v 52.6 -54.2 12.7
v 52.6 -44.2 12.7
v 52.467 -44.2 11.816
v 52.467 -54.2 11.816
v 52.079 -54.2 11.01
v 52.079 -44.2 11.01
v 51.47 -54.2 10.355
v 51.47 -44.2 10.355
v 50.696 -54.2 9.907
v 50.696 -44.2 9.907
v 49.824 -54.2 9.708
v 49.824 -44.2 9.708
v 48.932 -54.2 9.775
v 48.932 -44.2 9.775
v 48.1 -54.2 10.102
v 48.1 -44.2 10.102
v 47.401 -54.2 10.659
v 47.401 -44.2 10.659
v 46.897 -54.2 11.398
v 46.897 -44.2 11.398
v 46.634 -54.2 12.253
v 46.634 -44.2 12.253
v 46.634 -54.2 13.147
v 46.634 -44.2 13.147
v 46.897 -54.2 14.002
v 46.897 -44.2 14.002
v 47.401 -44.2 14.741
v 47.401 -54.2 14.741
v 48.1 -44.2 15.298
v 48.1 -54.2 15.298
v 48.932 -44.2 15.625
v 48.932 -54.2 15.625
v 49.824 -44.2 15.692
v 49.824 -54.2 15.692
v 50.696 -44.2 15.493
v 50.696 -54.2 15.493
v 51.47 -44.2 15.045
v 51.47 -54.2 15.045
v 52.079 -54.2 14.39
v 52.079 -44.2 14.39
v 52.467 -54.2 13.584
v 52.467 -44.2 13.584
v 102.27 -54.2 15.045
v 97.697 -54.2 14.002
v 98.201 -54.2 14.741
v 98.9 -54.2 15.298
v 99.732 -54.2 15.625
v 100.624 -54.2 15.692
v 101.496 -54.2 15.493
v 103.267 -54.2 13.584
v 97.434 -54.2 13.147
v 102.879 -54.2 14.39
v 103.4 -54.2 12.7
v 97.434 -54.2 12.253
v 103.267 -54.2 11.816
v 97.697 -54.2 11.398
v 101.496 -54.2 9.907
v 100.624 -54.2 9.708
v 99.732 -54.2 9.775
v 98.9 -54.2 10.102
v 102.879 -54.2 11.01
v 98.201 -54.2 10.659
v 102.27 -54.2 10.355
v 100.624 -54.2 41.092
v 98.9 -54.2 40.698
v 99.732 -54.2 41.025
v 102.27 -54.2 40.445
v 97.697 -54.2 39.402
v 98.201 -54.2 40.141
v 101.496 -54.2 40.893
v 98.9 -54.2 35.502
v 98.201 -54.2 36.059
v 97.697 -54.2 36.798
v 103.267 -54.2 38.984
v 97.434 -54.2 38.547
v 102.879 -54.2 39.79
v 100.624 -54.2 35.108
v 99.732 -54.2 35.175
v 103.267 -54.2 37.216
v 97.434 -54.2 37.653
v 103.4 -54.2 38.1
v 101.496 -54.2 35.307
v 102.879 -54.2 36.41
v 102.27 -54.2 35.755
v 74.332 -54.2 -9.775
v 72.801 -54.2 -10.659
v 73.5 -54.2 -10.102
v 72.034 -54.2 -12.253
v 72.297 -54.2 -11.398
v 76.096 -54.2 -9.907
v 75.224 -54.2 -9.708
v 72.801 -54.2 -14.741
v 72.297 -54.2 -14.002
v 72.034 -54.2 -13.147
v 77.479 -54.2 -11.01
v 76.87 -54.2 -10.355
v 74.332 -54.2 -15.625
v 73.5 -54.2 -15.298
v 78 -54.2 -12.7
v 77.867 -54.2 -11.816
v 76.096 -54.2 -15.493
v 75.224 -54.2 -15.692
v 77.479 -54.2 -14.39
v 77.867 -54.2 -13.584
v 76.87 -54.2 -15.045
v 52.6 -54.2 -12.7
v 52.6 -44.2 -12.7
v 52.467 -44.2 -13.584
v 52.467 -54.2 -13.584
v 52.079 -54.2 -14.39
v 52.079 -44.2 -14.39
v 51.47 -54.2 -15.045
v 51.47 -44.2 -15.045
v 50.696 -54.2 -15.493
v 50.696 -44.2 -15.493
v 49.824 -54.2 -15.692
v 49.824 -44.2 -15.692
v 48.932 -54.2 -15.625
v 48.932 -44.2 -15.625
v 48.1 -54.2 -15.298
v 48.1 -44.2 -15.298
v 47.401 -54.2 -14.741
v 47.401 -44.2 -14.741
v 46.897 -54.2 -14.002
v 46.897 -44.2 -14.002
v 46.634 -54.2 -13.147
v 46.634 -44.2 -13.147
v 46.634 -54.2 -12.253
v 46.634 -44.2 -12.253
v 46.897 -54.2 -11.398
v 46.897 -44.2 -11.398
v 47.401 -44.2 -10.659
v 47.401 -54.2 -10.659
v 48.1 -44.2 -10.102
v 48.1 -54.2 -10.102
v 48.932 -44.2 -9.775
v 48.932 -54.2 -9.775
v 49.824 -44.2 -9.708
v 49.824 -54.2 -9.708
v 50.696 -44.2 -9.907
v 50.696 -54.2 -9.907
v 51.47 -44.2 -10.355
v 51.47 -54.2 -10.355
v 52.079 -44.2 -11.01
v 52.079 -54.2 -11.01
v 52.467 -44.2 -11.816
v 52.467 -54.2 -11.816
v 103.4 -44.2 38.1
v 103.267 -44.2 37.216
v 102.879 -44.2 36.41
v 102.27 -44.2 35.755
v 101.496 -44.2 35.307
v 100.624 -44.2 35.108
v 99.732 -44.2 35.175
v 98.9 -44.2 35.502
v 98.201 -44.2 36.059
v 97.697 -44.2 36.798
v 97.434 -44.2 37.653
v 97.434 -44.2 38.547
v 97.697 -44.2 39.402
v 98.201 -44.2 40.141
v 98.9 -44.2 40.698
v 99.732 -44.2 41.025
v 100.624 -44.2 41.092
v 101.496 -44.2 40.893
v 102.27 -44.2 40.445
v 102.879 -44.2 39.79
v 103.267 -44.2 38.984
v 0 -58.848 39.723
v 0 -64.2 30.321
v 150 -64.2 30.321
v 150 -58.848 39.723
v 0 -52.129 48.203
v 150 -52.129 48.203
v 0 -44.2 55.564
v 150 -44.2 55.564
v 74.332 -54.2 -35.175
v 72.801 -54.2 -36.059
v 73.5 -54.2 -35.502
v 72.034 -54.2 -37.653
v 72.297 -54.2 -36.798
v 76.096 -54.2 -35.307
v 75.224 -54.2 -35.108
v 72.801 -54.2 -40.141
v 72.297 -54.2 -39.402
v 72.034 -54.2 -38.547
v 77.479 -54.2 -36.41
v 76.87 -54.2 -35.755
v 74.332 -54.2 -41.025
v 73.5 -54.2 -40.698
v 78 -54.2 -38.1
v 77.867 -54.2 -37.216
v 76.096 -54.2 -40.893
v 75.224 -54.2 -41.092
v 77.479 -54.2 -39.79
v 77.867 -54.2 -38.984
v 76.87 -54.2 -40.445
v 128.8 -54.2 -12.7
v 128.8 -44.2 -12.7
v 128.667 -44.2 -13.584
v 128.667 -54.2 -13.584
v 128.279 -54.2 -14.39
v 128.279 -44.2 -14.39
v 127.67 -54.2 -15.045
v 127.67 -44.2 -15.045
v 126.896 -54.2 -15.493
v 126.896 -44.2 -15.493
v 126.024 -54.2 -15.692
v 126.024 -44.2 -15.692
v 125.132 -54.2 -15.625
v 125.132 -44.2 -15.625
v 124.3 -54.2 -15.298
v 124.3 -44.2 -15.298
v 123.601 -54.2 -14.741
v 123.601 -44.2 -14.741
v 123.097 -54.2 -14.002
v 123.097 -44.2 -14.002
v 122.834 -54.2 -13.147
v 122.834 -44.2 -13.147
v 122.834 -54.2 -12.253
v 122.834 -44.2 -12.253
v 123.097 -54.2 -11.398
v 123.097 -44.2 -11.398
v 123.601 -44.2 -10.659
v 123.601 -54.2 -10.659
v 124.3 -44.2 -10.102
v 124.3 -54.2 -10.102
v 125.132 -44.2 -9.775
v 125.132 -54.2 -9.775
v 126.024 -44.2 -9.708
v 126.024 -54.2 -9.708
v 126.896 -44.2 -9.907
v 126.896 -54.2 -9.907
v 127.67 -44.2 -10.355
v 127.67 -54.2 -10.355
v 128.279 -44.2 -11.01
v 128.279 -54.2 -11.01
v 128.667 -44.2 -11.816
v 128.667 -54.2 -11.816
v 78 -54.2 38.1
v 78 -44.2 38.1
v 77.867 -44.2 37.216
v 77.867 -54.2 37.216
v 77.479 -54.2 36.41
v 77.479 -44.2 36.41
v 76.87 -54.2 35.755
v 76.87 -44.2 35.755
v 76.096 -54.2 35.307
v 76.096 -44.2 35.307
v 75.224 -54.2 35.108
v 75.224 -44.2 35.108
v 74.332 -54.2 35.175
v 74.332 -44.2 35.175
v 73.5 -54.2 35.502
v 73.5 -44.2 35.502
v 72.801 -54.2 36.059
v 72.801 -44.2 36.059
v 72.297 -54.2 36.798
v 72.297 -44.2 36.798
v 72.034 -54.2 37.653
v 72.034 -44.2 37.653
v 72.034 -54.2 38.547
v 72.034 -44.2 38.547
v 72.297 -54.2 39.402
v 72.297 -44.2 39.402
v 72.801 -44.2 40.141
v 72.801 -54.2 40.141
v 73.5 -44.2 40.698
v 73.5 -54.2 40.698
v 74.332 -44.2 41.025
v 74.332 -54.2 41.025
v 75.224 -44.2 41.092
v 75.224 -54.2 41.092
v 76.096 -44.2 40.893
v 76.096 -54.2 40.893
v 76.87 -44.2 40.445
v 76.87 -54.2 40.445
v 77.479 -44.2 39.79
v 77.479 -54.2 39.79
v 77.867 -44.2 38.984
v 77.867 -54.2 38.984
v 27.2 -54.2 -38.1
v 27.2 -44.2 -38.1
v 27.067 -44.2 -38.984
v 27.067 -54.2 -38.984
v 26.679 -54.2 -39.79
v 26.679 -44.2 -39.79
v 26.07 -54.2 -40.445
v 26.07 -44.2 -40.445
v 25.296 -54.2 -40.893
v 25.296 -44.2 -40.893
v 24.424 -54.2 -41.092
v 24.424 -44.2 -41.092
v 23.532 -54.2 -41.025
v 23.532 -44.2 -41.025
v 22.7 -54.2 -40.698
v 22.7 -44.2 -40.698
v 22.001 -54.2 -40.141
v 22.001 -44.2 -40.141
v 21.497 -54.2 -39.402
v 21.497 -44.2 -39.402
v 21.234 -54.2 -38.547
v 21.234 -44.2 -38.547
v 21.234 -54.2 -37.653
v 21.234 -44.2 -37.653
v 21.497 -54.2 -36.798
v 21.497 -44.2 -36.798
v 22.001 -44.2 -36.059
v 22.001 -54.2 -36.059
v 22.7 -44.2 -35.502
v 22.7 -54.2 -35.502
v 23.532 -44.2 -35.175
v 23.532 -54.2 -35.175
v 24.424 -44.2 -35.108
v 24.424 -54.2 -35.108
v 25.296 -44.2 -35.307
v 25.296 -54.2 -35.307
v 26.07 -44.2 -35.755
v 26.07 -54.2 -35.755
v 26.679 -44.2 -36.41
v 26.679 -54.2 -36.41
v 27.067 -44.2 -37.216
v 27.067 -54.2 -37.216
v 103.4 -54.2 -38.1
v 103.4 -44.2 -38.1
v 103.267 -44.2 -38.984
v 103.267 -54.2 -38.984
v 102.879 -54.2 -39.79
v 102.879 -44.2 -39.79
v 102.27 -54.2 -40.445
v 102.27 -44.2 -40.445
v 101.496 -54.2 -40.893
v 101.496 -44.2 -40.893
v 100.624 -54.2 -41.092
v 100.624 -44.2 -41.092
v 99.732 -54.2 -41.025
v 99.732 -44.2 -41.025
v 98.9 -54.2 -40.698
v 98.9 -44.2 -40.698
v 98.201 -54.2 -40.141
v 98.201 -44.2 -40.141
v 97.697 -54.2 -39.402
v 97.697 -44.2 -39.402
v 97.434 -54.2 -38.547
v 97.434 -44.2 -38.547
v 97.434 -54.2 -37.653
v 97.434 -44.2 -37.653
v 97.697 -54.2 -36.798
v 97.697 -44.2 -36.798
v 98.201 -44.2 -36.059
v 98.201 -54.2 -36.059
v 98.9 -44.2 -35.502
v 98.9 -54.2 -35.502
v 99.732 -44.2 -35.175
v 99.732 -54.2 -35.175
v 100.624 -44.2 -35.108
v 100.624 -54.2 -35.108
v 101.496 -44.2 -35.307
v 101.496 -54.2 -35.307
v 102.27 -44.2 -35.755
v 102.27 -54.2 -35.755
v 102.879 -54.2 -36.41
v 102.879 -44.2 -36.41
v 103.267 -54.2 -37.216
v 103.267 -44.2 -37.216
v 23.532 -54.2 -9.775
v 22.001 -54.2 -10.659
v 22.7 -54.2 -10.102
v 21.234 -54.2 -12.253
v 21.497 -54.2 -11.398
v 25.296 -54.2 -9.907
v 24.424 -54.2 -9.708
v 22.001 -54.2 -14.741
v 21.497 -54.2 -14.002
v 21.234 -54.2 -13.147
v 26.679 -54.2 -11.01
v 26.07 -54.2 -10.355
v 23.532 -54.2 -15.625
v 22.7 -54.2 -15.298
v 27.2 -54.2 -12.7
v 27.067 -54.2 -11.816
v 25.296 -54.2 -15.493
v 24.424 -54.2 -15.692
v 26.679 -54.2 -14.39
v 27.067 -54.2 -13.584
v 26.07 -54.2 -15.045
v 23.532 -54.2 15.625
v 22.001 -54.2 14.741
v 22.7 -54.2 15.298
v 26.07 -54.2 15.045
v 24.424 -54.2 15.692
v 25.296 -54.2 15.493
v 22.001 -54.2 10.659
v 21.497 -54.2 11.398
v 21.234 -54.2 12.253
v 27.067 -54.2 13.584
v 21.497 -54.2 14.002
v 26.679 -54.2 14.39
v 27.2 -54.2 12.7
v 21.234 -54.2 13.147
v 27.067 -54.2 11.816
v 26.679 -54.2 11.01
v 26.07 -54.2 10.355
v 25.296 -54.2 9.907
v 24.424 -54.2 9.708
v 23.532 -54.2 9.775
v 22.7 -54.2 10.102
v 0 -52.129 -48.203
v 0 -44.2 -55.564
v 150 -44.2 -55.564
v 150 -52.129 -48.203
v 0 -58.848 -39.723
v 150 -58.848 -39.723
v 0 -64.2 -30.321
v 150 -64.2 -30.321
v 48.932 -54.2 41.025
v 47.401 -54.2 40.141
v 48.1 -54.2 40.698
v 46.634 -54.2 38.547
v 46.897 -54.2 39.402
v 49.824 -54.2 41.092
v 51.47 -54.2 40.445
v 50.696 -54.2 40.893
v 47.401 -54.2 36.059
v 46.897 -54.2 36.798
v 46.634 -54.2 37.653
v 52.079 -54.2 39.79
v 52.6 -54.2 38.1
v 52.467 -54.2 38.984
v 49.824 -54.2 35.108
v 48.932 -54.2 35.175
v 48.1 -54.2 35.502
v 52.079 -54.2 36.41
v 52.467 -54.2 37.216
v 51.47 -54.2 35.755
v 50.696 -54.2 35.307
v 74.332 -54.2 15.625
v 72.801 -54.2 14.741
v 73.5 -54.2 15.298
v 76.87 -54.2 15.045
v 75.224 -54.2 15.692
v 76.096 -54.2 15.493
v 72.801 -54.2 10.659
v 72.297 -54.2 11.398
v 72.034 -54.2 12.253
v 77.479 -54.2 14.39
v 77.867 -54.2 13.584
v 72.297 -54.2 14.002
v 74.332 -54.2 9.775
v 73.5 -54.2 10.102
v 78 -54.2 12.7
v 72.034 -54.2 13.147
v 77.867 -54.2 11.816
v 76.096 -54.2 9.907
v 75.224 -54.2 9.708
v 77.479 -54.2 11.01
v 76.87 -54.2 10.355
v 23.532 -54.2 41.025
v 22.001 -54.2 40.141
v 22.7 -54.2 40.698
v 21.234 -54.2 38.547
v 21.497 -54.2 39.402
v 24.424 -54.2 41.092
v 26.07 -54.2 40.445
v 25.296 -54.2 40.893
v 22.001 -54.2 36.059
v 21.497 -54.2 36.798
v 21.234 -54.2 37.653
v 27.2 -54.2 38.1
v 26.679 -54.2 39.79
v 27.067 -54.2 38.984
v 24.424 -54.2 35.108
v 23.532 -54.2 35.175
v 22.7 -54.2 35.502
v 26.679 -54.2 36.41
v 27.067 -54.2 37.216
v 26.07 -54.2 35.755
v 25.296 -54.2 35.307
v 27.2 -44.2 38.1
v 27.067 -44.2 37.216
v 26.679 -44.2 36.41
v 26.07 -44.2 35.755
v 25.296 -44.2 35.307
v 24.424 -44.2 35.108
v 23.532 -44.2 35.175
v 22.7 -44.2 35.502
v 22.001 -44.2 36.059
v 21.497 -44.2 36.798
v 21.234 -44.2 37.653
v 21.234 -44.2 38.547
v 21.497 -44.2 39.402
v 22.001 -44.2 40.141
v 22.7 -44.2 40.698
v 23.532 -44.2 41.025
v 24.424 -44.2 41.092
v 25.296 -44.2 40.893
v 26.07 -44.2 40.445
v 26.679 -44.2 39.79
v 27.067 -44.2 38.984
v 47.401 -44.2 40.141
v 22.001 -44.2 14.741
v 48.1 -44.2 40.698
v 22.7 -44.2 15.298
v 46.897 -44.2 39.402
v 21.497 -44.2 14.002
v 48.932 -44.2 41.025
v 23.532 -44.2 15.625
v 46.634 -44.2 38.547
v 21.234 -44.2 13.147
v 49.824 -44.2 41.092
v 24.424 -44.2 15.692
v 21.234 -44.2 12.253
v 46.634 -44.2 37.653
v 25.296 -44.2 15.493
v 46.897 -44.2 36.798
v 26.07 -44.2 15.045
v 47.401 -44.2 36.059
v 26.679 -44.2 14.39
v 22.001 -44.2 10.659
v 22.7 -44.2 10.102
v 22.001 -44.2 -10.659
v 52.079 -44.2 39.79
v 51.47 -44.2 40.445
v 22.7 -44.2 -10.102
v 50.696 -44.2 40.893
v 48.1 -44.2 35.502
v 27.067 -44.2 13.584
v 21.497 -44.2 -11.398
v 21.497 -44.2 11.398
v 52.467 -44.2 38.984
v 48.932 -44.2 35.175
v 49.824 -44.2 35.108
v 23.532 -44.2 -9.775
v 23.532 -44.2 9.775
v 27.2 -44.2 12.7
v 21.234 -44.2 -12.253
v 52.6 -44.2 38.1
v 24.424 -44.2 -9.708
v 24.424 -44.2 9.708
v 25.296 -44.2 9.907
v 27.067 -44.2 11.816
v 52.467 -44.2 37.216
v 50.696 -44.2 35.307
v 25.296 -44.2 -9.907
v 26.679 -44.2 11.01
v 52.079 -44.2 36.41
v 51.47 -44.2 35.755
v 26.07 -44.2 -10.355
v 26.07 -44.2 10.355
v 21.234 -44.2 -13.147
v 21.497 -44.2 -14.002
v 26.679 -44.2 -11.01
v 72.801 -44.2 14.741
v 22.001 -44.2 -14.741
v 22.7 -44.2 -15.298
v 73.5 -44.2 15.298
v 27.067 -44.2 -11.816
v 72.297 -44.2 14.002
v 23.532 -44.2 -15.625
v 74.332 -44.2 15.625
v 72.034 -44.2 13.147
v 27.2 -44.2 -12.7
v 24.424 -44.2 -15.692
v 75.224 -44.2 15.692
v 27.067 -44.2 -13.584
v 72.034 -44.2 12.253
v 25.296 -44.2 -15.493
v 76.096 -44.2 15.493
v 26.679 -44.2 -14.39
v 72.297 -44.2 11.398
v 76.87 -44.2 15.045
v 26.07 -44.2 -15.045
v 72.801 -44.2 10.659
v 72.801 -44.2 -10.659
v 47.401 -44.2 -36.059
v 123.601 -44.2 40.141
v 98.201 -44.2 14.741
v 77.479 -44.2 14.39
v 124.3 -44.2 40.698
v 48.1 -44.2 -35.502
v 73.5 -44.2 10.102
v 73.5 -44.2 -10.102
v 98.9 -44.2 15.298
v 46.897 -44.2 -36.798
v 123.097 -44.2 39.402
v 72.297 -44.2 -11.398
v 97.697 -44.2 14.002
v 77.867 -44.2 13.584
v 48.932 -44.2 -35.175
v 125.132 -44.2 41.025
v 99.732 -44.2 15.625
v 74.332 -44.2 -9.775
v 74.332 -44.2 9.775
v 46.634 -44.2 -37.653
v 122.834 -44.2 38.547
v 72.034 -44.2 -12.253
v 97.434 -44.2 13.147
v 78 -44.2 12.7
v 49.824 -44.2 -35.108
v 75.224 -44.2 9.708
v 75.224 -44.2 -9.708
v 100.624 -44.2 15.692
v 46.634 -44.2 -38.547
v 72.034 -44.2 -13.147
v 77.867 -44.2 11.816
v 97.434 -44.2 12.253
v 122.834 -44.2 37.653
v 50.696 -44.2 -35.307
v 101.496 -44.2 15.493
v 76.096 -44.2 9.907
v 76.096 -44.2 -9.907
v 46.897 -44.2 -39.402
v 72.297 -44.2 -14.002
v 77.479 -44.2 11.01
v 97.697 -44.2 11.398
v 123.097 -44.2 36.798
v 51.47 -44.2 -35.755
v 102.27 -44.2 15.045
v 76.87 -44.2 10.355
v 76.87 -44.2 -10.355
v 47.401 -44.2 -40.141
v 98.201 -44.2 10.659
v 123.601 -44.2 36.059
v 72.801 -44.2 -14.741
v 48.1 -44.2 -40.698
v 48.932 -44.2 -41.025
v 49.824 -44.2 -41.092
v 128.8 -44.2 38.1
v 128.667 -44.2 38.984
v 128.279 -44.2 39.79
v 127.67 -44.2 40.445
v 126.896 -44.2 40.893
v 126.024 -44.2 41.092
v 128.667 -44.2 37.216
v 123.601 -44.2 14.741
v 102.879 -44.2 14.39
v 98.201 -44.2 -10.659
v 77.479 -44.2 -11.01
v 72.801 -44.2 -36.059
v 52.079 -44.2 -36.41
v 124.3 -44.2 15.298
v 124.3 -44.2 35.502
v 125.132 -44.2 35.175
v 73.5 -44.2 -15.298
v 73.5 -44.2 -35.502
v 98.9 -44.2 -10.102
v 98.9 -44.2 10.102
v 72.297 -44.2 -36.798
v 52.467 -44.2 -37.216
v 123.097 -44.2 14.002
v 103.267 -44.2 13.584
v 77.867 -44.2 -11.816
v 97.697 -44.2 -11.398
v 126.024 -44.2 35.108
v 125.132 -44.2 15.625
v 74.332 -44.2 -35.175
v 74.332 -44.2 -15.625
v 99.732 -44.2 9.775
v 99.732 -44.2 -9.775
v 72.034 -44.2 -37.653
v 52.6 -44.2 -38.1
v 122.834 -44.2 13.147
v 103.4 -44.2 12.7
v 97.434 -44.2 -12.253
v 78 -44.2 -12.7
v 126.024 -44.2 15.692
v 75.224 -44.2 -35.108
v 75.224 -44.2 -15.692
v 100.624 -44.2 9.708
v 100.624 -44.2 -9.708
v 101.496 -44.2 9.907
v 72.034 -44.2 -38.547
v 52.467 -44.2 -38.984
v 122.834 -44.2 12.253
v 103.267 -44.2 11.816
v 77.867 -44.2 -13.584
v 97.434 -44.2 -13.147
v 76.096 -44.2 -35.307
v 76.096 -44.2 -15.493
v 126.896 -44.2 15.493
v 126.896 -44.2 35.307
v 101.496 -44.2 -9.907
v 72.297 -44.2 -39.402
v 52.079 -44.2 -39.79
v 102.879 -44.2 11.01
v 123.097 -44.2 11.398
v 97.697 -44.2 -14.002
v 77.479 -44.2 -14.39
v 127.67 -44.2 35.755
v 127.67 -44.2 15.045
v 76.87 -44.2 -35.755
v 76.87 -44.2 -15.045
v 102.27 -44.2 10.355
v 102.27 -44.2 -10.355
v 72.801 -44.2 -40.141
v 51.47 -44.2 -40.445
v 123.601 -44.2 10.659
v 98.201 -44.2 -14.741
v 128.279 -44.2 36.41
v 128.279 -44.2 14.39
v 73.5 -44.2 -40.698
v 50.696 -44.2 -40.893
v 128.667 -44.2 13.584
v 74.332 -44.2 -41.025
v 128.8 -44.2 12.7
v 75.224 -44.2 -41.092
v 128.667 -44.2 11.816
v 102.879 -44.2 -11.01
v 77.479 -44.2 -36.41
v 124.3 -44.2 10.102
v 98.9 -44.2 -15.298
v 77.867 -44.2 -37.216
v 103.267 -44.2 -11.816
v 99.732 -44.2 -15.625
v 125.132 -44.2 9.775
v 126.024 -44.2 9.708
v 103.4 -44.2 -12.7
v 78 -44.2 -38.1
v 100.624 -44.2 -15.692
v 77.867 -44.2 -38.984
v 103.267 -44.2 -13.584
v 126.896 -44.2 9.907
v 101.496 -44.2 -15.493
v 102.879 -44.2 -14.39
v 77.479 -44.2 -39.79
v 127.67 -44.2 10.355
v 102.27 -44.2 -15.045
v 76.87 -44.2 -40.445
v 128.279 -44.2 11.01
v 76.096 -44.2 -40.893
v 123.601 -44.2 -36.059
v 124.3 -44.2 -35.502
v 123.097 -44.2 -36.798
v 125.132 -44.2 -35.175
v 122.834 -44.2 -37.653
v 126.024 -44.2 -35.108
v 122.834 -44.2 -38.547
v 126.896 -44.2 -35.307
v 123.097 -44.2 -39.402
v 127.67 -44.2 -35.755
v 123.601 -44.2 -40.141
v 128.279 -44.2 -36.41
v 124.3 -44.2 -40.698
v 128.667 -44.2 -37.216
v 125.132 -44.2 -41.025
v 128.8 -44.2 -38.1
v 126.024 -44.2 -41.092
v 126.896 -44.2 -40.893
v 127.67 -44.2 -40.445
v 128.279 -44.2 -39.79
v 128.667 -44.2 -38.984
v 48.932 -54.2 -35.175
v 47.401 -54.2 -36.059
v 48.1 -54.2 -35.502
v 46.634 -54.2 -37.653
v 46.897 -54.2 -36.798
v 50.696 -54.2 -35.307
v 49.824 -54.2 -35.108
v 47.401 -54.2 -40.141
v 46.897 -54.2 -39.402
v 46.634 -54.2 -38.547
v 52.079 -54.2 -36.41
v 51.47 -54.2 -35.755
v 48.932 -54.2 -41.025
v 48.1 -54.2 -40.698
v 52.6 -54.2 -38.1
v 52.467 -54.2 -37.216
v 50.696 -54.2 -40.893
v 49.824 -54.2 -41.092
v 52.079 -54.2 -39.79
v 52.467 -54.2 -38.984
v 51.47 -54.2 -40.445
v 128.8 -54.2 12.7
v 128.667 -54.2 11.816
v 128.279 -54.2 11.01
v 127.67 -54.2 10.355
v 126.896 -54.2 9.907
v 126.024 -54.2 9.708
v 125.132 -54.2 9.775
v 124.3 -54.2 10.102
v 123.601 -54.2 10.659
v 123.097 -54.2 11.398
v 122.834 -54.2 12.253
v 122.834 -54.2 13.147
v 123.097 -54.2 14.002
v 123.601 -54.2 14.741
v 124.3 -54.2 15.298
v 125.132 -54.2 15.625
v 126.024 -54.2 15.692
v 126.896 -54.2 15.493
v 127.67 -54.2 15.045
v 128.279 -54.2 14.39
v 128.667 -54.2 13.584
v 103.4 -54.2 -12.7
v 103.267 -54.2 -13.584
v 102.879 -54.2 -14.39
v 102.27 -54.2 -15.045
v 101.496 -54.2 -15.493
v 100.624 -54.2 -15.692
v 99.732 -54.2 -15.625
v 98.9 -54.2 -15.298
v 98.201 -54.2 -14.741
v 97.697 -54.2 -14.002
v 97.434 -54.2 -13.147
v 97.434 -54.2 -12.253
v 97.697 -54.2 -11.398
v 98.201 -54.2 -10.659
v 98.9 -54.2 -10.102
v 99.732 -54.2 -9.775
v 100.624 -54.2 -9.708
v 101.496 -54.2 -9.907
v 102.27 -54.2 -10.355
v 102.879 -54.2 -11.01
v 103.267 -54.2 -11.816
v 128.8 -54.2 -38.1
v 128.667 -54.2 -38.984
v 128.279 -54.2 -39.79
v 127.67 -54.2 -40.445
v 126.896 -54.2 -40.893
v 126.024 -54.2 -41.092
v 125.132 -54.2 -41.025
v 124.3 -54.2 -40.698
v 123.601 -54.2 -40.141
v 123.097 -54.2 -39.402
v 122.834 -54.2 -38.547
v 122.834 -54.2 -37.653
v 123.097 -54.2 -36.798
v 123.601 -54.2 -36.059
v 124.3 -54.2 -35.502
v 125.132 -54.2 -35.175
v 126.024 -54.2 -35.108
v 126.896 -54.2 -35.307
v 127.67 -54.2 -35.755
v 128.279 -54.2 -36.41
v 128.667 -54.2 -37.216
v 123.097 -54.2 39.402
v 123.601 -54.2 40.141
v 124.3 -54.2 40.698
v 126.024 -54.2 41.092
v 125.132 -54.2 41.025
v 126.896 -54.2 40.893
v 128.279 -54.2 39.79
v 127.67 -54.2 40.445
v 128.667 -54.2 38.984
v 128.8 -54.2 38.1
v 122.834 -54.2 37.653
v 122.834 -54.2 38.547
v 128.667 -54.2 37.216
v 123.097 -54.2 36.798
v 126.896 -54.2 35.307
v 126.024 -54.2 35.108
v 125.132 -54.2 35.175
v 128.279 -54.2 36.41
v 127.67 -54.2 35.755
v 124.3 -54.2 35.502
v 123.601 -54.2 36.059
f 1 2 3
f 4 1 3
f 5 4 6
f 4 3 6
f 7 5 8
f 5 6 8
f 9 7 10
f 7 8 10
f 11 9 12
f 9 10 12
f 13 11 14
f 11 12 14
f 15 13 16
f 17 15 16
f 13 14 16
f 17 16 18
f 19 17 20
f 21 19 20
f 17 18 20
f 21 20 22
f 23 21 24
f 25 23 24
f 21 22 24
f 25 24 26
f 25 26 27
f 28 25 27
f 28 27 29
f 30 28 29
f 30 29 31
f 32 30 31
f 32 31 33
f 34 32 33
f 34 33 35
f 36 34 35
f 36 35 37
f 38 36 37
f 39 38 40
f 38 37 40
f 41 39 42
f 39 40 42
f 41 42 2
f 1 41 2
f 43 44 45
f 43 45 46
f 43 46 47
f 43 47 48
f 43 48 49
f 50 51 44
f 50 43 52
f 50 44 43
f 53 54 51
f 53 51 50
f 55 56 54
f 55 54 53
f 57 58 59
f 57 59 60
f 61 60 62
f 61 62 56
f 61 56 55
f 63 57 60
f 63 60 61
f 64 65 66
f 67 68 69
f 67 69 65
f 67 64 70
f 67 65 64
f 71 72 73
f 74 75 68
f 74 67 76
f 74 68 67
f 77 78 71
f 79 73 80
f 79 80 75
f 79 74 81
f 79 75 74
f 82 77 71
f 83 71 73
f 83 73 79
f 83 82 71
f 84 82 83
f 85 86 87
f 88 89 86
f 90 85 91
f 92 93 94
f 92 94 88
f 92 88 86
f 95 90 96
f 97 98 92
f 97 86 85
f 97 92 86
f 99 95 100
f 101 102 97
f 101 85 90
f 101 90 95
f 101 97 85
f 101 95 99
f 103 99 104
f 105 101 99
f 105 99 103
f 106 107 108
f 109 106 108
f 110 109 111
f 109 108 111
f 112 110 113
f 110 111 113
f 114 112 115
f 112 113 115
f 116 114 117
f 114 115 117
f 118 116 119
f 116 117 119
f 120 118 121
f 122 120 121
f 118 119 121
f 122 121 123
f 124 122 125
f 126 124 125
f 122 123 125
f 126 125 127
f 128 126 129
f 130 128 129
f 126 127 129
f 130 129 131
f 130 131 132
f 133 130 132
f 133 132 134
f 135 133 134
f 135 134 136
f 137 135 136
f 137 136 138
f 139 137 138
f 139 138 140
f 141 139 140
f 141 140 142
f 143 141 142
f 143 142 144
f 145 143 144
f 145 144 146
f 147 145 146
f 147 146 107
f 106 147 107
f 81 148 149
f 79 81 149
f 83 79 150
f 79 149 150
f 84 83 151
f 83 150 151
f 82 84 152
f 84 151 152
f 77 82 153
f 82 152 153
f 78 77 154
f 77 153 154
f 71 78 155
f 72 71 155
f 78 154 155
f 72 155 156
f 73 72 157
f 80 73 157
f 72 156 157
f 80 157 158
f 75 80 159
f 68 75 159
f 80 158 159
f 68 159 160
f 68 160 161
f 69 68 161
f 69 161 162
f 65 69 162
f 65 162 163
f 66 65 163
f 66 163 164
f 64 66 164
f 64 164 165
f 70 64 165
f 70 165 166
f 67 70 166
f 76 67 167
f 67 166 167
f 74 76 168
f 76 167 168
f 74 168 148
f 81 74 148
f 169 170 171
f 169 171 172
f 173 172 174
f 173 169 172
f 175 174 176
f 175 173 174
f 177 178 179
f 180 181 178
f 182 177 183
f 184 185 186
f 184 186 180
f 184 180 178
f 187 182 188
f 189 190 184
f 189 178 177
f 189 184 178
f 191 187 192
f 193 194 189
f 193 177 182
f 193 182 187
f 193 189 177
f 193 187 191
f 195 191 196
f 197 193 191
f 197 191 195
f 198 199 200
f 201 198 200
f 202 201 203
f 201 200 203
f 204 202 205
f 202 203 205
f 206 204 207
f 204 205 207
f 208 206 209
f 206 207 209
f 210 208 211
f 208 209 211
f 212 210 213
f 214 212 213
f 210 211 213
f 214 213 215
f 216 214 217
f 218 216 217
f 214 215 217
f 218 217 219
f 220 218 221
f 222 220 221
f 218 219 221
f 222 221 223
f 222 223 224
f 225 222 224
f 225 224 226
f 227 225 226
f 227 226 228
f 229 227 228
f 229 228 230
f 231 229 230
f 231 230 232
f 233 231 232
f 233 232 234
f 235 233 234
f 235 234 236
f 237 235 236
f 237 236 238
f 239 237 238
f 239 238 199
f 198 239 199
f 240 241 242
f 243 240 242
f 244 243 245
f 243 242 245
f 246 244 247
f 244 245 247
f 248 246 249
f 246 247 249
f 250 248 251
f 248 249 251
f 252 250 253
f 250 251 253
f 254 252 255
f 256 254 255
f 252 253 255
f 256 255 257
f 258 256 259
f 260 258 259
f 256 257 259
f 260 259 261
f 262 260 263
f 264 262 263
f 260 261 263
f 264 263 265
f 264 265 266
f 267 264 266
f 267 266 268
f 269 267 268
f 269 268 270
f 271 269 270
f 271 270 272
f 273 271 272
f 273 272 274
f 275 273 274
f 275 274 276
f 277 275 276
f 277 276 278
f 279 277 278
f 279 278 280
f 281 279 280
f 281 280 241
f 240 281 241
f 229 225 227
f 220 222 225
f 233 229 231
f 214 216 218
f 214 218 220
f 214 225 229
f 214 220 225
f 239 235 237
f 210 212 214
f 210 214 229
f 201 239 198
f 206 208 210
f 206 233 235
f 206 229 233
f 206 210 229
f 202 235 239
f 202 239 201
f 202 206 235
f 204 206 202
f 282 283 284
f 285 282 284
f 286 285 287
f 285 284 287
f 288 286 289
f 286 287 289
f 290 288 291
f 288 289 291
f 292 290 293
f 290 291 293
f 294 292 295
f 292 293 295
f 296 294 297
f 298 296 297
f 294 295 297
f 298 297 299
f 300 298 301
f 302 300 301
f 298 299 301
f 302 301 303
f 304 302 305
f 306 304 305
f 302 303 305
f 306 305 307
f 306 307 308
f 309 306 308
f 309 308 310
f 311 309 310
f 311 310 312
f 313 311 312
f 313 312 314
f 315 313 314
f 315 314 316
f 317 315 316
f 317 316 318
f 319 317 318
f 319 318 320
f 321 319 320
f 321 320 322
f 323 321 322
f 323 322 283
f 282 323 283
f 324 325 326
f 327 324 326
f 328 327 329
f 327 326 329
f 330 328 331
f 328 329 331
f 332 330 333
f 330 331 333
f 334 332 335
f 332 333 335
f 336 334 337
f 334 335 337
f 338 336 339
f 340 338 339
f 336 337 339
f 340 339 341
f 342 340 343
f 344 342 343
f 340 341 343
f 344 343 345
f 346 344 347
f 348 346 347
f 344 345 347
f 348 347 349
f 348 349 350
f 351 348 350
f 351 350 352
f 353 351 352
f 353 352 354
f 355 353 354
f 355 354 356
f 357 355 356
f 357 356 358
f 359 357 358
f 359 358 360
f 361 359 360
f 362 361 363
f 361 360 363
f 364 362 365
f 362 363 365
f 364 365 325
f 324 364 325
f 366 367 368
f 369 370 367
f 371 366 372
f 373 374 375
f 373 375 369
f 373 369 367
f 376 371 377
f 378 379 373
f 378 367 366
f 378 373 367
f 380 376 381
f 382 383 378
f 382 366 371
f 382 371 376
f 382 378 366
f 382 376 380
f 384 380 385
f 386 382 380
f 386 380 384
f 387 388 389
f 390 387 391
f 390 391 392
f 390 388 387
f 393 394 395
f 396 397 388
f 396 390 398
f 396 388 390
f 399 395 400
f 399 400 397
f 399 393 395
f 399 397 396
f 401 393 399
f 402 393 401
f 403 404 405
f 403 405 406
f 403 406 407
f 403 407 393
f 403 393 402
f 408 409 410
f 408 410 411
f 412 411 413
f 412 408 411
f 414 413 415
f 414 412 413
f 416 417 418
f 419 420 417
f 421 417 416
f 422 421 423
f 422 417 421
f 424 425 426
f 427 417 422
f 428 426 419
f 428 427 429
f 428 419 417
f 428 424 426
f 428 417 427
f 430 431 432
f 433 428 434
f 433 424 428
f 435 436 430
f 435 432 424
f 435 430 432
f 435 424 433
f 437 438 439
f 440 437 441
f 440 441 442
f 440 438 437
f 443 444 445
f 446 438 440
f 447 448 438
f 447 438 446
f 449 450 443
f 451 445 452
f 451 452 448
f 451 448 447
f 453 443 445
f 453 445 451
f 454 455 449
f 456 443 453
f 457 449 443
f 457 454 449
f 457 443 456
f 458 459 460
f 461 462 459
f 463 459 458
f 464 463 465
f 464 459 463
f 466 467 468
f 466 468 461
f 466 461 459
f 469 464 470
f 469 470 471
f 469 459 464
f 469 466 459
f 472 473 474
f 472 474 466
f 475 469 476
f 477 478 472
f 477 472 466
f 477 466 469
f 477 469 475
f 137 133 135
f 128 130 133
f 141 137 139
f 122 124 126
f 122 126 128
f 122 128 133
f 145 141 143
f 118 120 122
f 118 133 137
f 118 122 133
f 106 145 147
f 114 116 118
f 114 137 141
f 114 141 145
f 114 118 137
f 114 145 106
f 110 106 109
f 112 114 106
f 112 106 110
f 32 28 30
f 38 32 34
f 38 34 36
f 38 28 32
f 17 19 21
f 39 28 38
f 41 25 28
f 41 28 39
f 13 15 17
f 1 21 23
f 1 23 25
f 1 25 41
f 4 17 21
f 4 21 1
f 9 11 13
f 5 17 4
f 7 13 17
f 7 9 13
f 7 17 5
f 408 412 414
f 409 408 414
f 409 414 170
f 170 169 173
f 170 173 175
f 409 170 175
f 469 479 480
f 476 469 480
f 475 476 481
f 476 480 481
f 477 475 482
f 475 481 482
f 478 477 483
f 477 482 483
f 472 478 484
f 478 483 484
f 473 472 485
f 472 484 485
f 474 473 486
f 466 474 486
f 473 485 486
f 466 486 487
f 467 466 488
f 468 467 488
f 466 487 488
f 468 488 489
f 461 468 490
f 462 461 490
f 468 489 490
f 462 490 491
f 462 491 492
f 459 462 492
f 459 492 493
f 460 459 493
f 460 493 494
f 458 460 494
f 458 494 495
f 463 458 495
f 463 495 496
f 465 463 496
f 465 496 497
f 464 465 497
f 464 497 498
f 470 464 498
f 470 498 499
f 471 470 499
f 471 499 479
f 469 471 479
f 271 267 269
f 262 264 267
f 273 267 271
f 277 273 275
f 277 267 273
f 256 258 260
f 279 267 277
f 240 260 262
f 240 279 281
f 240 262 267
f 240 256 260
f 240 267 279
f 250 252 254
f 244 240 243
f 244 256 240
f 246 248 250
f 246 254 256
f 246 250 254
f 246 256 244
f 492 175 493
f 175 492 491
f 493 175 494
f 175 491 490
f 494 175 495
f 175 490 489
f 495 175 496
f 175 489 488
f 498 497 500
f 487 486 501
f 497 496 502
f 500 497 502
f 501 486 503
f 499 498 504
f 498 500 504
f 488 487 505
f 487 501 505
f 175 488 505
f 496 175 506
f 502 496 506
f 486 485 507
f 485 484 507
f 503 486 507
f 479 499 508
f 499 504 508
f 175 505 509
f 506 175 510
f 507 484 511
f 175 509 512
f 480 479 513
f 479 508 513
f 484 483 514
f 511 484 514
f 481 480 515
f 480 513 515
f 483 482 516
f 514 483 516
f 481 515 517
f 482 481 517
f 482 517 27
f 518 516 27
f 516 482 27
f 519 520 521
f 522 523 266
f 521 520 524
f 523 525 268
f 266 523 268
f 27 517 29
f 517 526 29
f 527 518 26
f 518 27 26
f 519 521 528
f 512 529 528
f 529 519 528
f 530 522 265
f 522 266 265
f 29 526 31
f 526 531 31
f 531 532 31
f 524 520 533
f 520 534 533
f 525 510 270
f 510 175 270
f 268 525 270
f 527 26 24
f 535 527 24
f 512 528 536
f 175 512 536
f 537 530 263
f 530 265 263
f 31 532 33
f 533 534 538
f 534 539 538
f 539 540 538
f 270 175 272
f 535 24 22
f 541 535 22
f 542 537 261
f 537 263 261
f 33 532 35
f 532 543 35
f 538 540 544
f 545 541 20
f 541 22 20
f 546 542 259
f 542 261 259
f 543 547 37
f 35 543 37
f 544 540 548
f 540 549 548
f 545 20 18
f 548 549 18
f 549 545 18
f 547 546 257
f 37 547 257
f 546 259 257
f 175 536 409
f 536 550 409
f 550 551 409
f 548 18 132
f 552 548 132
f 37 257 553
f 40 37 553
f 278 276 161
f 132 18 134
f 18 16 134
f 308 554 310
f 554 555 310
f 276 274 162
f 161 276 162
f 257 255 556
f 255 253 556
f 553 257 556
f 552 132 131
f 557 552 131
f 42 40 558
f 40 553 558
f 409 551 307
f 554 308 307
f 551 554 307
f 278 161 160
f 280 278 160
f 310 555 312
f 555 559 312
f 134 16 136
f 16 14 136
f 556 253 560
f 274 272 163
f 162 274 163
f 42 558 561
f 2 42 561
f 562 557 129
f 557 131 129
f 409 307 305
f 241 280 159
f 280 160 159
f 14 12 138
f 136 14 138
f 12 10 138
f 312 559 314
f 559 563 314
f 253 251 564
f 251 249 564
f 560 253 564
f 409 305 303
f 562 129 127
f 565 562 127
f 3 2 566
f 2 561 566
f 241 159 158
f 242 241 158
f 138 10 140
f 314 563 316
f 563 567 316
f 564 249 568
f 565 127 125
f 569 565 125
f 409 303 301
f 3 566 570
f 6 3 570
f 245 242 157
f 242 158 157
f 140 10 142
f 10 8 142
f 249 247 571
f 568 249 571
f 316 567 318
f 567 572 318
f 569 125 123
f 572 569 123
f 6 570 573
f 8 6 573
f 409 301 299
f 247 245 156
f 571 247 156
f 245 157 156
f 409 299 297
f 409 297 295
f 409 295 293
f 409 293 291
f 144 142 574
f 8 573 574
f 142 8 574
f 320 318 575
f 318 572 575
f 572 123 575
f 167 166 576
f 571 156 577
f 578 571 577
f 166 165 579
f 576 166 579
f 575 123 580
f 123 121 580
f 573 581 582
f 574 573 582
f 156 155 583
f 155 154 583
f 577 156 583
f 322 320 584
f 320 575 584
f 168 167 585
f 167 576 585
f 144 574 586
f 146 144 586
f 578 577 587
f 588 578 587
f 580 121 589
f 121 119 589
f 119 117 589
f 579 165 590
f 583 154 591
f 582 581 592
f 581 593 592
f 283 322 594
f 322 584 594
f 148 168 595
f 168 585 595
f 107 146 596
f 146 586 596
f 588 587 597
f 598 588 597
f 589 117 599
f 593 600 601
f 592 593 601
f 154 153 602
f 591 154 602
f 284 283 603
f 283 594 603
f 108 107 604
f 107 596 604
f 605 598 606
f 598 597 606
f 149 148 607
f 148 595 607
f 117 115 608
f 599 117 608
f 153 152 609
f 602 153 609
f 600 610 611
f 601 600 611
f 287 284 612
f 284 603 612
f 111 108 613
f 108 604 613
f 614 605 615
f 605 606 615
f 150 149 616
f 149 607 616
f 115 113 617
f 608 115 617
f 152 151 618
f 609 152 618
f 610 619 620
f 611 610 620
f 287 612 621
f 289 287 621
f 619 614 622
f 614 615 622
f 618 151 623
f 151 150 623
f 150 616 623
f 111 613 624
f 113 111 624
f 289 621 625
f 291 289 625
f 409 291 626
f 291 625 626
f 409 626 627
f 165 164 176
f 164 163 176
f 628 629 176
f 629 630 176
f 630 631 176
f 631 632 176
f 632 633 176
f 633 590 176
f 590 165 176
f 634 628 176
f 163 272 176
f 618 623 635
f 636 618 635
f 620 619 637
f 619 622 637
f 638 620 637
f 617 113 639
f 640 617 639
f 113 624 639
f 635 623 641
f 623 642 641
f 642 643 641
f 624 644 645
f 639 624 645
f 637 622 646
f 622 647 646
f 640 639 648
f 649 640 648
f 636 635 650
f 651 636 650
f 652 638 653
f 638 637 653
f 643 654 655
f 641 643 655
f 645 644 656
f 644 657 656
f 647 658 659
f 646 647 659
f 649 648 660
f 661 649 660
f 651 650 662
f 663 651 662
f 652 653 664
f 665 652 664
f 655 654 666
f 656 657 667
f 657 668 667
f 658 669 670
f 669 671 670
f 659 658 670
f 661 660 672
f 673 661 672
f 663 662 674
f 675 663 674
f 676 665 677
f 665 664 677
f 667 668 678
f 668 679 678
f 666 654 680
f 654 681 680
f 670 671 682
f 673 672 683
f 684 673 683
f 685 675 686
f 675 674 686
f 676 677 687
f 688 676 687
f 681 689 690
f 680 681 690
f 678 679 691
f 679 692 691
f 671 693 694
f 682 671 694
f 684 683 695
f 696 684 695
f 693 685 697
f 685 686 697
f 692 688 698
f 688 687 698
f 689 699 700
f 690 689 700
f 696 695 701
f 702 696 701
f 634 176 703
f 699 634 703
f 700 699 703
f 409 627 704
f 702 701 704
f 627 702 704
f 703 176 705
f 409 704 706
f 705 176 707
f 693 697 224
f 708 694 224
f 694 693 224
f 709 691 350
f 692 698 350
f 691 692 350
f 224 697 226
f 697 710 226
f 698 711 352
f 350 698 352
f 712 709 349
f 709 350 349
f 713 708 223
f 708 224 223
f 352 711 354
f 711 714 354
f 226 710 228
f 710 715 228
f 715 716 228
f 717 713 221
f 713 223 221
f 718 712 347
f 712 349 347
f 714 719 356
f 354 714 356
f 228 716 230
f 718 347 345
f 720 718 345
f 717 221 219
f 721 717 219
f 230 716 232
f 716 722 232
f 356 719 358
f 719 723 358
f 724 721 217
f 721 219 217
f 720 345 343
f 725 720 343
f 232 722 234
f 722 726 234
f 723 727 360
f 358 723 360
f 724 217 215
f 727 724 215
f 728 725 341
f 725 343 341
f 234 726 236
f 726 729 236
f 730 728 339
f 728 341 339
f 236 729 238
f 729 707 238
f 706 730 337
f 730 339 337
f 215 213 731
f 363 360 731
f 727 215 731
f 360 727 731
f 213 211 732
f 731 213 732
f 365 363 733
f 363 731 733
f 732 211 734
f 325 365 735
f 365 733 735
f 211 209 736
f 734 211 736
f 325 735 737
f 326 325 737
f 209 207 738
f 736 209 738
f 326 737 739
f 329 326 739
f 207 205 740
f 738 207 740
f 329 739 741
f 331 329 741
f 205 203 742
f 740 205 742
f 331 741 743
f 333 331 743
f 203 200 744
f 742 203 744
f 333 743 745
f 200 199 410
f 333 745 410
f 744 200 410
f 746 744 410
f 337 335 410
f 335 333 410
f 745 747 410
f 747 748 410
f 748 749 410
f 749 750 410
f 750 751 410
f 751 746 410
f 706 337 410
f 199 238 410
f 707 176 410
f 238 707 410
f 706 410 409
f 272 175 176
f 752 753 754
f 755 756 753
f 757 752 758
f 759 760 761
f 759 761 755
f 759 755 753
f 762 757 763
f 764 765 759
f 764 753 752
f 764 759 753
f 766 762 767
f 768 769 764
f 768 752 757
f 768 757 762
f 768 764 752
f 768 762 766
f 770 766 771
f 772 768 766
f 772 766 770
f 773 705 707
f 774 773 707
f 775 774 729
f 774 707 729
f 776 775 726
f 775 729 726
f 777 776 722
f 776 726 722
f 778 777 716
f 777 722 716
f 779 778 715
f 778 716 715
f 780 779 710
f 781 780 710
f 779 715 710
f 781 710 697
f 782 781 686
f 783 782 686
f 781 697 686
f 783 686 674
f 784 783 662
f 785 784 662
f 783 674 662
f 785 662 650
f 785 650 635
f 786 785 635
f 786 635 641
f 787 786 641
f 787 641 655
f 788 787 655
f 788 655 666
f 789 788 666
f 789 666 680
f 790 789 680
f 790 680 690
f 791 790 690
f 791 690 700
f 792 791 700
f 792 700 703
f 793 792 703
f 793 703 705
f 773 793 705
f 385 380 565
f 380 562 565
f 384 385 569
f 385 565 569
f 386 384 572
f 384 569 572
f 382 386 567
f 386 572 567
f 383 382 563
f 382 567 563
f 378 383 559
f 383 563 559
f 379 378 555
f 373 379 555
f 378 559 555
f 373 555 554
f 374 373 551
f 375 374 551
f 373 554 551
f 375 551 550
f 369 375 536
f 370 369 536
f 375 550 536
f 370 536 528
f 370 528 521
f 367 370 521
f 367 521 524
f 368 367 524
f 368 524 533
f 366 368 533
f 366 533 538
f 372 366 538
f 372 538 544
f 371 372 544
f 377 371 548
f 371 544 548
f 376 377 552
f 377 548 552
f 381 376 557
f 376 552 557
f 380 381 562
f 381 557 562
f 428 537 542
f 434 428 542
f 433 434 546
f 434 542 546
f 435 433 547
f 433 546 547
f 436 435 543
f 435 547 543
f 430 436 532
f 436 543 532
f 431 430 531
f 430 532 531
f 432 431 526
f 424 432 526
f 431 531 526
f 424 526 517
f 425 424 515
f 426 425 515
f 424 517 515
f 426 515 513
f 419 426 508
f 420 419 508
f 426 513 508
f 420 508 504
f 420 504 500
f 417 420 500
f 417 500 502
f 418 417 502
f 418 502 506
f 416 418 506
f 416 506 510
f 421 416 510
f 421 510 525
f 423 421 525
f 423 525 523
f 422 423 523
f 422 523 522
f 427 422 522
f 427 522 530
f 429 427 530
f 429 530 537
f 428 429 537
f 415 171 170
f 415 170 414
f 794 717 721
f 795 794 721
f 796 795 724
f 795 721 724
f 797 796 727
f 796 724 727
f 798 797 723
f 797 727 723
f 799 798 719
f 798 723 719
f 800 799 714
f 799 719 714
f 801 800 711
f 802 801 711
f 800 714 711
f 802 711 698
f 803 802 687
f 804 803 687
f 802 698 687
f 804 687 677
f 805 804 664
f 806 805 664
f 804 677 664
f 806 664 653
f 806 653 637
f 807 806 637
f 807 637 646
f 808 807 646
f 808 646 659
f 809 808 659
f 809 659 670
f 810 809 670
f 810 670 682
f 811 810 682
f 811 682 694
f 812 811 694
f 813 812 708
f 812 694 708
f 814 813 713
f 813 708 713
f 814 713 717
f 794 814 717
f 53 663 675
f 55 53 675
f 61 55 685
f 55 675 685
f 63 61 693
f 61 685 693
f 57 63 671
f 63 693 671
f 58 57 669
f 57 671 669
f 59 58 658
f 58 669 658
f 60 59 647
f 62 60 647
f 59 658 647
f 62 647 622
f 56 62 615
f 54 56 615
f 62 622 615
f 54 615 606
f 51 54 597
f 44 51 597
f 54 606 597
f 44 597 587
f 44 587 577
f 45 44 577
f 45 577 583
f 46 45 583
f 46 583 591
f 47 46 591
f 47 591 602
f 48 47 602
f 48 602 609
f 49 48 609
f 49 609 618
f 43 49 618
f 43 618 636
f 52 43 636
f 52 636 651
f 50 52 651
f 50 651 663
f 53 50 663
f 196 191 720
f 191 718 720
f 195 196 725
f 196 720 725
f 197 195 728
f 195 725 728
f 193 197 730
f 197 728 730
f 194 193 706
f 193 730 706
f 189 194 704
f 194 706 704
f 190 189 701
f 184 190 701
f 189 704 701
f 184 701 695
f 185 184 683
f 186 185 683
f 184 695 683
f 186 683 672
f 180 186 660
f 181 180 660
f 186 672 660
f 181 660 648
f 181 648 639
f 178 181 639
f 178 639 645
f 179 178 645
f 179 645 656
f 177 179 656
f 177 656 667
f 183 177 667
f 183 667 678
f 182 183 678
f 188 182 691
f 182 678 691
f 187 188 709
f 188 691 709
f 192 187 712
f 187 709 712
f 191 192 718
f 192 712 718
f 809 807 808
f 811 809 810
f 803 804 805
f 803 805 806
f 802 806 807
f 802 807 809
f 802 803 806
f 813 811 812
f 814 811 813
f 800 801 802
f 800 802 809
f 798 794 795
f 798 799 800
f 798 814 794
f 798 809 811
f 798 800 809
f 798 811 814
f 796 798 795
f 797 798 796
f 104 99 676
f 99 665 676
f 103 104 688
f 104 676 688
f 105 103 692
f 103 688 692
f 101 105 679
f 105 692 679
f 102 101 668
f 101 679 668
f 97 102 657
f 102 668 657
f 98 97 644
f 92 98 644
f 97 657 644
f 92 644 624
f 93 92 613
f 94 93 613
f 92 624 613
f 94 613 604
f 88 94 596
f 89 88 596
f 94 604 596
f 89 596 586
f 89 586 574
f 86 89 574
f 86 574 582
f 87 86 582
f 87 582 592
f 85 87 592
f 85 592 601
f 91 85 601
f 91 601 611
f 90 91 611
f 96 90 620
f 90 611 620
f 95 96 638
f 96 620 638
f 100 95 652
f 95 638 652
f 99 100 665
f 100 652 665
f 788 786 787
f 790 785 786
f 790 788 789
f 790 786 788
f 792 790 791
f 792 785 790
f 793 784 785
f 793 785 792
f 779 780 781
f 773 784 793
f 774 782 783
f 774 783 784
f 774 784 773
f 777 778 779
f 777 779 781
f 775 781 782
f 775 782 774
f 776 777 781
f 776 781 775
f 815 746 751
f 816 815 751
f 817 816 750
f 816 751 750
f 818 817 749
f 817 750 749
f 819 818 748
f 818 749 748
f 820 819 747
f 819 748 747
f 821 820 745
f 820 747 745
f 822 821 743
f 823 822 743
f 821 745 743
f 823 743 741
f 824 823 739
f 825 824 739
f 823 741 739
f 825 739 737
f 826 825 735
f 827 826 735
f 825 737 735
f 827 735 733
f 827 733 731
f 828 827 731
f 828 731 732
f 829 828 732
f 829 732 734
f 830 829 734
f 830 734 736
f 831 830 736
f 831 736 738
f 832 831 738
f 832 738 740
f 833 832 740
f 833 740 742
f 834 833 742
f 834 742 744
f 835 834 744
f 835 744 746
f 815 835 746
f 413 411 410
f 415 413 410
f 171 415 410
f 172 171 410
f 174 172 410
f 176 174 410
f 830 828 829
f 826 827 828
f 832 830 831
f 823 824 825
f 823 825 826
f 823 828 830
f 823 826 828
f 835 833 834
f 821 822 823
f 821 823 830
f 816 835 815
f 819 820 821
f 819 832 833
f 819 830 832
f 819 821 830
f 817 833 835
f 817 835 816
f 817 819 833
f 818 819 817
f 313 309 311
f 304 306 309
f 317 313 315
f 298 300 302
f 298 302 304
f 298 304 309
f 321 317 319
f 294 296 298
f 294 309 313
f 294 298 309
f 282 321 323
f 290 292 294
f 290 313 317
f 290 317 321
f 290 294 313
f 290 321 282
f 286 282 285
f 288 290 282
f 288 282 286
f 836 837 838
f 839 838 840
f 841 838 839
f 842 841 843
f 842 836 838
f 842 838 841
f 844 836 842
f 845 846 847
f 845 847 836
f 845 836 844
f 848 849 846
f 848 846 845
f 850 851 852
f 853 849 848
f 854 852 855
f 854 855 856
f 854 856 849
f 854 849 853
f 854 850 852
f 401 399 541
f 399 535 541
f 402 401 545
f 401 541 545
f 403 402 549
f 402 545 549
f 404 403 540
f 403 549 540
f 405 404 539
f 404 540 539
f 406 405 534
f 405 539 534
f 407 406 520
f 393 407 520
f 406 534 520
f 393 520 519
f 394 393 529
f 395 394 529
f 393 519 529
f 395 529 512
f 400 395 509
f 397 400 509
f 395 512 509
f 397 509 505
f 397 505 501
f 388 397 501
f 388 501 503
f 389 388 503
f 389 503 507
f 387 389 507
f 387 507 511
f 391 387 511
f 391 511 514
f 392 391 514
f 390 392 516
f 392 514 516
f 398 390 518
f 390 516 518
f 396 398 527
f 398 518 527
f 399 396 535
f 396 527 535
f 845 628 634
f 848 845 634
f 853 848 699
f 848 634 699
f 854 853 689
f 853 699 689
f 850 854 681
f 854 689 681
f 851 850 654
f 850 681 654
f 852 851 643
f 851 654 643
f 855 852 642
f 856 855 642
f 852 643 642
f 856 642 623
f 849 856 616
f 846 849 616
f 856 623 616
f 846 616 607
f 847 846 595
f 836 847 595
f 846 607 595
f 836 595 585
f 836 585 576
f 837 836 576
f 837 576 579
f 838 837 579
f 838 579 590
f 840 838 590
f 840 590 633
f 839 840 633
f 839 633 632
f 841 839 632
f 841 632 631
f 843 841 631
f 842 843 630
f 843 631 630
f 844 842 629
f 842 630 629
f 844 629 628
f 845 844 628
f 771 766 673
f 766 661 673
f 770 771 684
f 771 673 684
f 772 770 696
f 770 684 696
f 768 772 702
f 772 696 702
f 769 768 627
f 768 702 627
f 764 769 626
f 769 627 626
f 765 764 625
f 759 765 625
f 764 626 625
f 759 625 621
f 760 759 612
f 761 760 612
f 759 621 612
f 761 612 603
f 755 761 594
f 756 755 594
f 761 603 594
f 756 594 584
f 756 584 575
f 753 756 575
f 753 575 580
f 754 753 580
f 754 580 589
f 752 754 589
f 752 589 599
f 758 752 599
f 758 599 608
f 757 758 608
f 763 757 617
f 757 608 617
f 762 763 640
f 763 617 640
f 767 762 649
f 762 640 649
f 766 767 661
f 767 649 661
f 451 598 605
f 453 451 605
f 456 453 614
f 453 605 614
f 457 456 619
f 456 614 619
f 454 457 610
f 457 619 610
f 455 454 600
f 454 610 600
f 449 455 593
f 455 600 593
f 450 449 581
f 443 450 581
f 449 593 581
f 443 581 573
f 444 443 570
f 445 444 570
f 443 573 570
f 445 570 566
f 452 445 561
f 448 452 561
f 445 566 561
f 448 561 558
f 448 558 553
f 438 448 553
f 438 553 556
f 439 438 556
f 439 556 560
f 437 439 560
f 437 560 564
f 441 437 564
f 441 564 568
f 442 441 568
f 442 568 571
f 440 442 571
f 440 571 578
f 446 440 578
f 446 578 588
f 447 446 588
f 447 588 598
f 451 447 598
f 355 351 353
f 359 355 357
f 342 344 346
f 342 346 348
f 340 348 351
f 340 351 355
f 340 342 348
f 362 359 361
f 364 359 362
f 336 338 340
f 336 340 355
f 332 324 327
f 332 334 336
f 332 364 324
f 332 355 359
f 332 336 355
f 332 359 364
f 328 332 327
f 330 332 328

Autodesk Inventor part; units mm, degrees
ref_plane "YZ Plane" through (0, 0, 0) normal (1, 0, 0) x (0, 1, 0)
ref_plane "XZ Plane" through (0, 0, 0) normal (0, 1, 0) x (-1, 0, 0)
ref_plane "XY Plane" through (0, 0, 0) normal (0, 0, 1) x (1, 0, 0)
sketch "Sketch1" plane through (0, 0, 0) normal (1, 0, 0) x (0, 1, 0)
  circle A0 centre (0, 0) radius 71
  dimension "d0" = 142
extrude "Extrusion1" add sketch "Sketch1" along normal blind 150
sketch "Sketch2" plane through (150, 0, 0) normal (1, 0, 0) x (0, 0, -1)
  line L0 (0, 0) -> (0, -44.2)
  circle A0 centre (0, 0) radius 71 projected
  line L1 (-55.564, -44.2) -> (55.564, -44.2)
  dimension "d3" = 44.2
extrude "Extrusion2" cut sketch "Sketch2" against normal blind 150 contours A0 L1 picked at (-0.2063, 32.437)
sketch "Sketch3" plane through (150, 0, 0) normal (1, 0, 0) x (0, 0, -1)
  line L0 (0, 0) -> (0, -64.2)
  arc A0 (-55.564, -44.2) -> (55.564, -44.2) centre (0, 0) ccw projected
  line L1 (-30.3209, -64.2) -> (30.3209, -64.2)
  dimension "d6" = 64.2
sketch "Sketch5" plane through (150, -44.2, 55.564) normal (0, 1, 0) x (1, 0, 0)
  line L0 (-150, 55.564) -> (-75, 55.564)
  line L1 (-75, 55.564) -> (-75, 68.264)
  line L2 (-75, 55.564) -> (-75, 42.864)
  circle A0 centre (-75, 68.264) radius 3
  circle A1 centre (-75, 42.864) radius 3
  line L3 (-75, 68.264) -> (-49.6, 68.264)
  line L4 (-75, 42.864) -> (-49.6, 42.864)
  line L5 (-75, 68.264) -> (-100.4, 68.264)
  line L6 (-75, 42.864) -> (-100.4, 42.864)
  circle A2 centre (-100.4, 68.264) radius 3
  circle A3 centre (-49.6, 68.264) radius 3
  circle A4 centre (-49.6, 42.864) radius 3
  circle A5 centre (-100.4, 42.864) radius 3
  line L7 (-100.4, 42.864) -> (-125.8, 42.864)
  line L8 (-100.4, 68.264) -> (-125.8, 68.264)
  line L9 (-49.6, 68.264) -> (-24.2, 68.264)
  line L10 (-49.6, 42.864) -> (-24.2, 42.864)
  circle A6 centre (-125.8, 68.264) radius 3
  circle A7 centre (-125.8, 42.864) radius 3
  circle A8 centre (-24.2, 68.264) radius 3
  circle A9 centre (-24.2, 42.864) radius 3
  line L11 (-125.8, 68.264) -> (-125.8, 93.664)
  line L12 (-100.4, 68.264) -> (-100.4, 93.664)
  line L13 (-75, 68.264) -> (-75, 93.664)
  line L14 (-75, 68.264) -> (-49.6, 68.264) construction
  line L15 (-49.6, 68.264) -> (-49.6, 93.664)
  line L16 (-24.2, 68.264) -> (-24.2, 93.664)
  line L17 (-125.8, 42.864) -> (-125.8, 17.464)
  line L18 (-100.4, 42.864) -> (-100.4, 17.464)
  line L19 (-75, 42.864) -> (-75, 17.464)
  line L20 (-49.6, 42.864) -> (-49.6, 17.464)
  line L21 (-24.2, 42.864) -> (-24.2, 17.464)
  circle A10 centre (-125.8, 93.664) radius 3
  circle A11 centre (-100.4, 93.664) radius 3
  circle A12 centre (-75, 93.664) radius 3
  circle A13 centre (-49.6, 93.664) radius 3
  circle A14 centre (-24.2, 93.664) radius 3
  circle A15 centre (-24.2, 17.464) radius 3
  circle A16 centre (-49.6, 17.464) radius 3
  circle A17 centre (-75, 17.464) radius 3
  circle A18 centre (-100.4, 17.464) radius 3
  circle A19 centre (-125.8, 17.464) radius 3
  dimension "d9" = 75
  dimension "d10" = 12.7
  dimension "d11" = 12.7
  dimension "d12" = 6
  dimension "d13" = 6
  dimension "d14" = 25.4
  dimension "d15" = 25.4
  dimension "d16" = 25.4
  dimension "d17" = 25.4
  dimension "d18" = 6
  dimension "d19" = 6
  dimension "d20" = 6
  dimension "d21" = 6
  dimension "d22" = 25.4
  dimension "d23" = 25.4
  dimension "d24" = 25.4
  dimension "d25" = 25.4
  dimension "d26" = 6
  dimension "d27" = 6
  dimension "d28" = 6
  dimension "d29" = 6
  dimension "d30" = 25.4
  dimension "d31" = 25.4
  dimension "d32" = 25.4
  dimension "d33" = 90
  dimension "d34" = 25.4
  dimension "d35" = 25.4
  dimension "d36" = 25.4
  dimension "d37" = 25.4
  dimension "d38" = 25.4
  dimension "d39" = 25.4
  dimension "d40" = 25.4
  dimension "d41" = 6
  dimension "d42" = 6
  dimension "d43" = 6
  dimension "d44" = 6
  dimension "d45" = 6
  dimension "d46" = 6
  dimension "d47" = 6
  dimension "d48" = 6
  dimension "d49" = 6
  dimension "d50" = 6
sketch "Sketch6" plane through (150, 0, 0) normal (1, 0, 0) x (0, 0, -1)
  point P0 (0, 0)
extrude "Extrusion4" cut sketch "Sketch3" against normal blind 150
extrude "Extrusion5" cut sketch "Sketch5" against normal blind 10
thread "Thread1" size "M6x1" class "6H" standard "ANSI Metric M Profile" full length
thread "Thread2" size "M6x1" class "6H" standard "ANSI Metric M Profile" full length
thread "Thread3" size "M6x1" class "6H" standard "ANSI Metric M Profile" full length
thread "Thread4" size "M6x1" class "6H" standard "ANSI Metric M Profile" full length
thread "Thread5" size "M6x1" class "6H" standard "ANSI Metric M Profile" full length
thread "Thread6" size "M6x1" class "6H" standard "ANSI Metric M Profile" full length
thread "Thread7" size "M6x1" class "6H" standard "ANSI Metric M Profile" full length
thread "Thread8" size "M6x1" class "6H" standard "ANSI Metric M Profile" full length
thread "Thread9" size "M6x1" class "6H" standard "ANSI Metric M Profile" full length
thread "Thread10" size "M6x1" class "6H" standard "ANSI Metric M Profile" full length
thread "Thread11" size "M6x1" class "6H" standard "ANSI Metric M Profile" full length
thread "Thread12" size "M6x1" class "6H" standard "ANSI Metric M Profile" full length
thread "Thread13" size "M6x1" class "6H" standard "ANSI Metric M Profile" full length
thread "Thread14" size "M6x1" class "6H" standard "ANSI Metric M Profile" full length
thread "Thread15" size "M6x1" class "6H" standard "ANSI Metric M Profile" full length
thread "Thread16" size "M6x1" class "6H" standard "ANSI Metric M Profile" full length
thread "Thread17" size "M6x1" class "6H" standard "ANSI Metric M Profile" full length
thread "Thread18" size "M6x1" class "6H" standard "ANSI Metric M Profile" full length
thread "Thread19" size "M6x1" class "6H" standard "ANSI Metric M Profile" full length
thread "Thread20" size "M6x1" class "6H" standard "ANSI Metric M Profile" full length
properties part number "Base"
